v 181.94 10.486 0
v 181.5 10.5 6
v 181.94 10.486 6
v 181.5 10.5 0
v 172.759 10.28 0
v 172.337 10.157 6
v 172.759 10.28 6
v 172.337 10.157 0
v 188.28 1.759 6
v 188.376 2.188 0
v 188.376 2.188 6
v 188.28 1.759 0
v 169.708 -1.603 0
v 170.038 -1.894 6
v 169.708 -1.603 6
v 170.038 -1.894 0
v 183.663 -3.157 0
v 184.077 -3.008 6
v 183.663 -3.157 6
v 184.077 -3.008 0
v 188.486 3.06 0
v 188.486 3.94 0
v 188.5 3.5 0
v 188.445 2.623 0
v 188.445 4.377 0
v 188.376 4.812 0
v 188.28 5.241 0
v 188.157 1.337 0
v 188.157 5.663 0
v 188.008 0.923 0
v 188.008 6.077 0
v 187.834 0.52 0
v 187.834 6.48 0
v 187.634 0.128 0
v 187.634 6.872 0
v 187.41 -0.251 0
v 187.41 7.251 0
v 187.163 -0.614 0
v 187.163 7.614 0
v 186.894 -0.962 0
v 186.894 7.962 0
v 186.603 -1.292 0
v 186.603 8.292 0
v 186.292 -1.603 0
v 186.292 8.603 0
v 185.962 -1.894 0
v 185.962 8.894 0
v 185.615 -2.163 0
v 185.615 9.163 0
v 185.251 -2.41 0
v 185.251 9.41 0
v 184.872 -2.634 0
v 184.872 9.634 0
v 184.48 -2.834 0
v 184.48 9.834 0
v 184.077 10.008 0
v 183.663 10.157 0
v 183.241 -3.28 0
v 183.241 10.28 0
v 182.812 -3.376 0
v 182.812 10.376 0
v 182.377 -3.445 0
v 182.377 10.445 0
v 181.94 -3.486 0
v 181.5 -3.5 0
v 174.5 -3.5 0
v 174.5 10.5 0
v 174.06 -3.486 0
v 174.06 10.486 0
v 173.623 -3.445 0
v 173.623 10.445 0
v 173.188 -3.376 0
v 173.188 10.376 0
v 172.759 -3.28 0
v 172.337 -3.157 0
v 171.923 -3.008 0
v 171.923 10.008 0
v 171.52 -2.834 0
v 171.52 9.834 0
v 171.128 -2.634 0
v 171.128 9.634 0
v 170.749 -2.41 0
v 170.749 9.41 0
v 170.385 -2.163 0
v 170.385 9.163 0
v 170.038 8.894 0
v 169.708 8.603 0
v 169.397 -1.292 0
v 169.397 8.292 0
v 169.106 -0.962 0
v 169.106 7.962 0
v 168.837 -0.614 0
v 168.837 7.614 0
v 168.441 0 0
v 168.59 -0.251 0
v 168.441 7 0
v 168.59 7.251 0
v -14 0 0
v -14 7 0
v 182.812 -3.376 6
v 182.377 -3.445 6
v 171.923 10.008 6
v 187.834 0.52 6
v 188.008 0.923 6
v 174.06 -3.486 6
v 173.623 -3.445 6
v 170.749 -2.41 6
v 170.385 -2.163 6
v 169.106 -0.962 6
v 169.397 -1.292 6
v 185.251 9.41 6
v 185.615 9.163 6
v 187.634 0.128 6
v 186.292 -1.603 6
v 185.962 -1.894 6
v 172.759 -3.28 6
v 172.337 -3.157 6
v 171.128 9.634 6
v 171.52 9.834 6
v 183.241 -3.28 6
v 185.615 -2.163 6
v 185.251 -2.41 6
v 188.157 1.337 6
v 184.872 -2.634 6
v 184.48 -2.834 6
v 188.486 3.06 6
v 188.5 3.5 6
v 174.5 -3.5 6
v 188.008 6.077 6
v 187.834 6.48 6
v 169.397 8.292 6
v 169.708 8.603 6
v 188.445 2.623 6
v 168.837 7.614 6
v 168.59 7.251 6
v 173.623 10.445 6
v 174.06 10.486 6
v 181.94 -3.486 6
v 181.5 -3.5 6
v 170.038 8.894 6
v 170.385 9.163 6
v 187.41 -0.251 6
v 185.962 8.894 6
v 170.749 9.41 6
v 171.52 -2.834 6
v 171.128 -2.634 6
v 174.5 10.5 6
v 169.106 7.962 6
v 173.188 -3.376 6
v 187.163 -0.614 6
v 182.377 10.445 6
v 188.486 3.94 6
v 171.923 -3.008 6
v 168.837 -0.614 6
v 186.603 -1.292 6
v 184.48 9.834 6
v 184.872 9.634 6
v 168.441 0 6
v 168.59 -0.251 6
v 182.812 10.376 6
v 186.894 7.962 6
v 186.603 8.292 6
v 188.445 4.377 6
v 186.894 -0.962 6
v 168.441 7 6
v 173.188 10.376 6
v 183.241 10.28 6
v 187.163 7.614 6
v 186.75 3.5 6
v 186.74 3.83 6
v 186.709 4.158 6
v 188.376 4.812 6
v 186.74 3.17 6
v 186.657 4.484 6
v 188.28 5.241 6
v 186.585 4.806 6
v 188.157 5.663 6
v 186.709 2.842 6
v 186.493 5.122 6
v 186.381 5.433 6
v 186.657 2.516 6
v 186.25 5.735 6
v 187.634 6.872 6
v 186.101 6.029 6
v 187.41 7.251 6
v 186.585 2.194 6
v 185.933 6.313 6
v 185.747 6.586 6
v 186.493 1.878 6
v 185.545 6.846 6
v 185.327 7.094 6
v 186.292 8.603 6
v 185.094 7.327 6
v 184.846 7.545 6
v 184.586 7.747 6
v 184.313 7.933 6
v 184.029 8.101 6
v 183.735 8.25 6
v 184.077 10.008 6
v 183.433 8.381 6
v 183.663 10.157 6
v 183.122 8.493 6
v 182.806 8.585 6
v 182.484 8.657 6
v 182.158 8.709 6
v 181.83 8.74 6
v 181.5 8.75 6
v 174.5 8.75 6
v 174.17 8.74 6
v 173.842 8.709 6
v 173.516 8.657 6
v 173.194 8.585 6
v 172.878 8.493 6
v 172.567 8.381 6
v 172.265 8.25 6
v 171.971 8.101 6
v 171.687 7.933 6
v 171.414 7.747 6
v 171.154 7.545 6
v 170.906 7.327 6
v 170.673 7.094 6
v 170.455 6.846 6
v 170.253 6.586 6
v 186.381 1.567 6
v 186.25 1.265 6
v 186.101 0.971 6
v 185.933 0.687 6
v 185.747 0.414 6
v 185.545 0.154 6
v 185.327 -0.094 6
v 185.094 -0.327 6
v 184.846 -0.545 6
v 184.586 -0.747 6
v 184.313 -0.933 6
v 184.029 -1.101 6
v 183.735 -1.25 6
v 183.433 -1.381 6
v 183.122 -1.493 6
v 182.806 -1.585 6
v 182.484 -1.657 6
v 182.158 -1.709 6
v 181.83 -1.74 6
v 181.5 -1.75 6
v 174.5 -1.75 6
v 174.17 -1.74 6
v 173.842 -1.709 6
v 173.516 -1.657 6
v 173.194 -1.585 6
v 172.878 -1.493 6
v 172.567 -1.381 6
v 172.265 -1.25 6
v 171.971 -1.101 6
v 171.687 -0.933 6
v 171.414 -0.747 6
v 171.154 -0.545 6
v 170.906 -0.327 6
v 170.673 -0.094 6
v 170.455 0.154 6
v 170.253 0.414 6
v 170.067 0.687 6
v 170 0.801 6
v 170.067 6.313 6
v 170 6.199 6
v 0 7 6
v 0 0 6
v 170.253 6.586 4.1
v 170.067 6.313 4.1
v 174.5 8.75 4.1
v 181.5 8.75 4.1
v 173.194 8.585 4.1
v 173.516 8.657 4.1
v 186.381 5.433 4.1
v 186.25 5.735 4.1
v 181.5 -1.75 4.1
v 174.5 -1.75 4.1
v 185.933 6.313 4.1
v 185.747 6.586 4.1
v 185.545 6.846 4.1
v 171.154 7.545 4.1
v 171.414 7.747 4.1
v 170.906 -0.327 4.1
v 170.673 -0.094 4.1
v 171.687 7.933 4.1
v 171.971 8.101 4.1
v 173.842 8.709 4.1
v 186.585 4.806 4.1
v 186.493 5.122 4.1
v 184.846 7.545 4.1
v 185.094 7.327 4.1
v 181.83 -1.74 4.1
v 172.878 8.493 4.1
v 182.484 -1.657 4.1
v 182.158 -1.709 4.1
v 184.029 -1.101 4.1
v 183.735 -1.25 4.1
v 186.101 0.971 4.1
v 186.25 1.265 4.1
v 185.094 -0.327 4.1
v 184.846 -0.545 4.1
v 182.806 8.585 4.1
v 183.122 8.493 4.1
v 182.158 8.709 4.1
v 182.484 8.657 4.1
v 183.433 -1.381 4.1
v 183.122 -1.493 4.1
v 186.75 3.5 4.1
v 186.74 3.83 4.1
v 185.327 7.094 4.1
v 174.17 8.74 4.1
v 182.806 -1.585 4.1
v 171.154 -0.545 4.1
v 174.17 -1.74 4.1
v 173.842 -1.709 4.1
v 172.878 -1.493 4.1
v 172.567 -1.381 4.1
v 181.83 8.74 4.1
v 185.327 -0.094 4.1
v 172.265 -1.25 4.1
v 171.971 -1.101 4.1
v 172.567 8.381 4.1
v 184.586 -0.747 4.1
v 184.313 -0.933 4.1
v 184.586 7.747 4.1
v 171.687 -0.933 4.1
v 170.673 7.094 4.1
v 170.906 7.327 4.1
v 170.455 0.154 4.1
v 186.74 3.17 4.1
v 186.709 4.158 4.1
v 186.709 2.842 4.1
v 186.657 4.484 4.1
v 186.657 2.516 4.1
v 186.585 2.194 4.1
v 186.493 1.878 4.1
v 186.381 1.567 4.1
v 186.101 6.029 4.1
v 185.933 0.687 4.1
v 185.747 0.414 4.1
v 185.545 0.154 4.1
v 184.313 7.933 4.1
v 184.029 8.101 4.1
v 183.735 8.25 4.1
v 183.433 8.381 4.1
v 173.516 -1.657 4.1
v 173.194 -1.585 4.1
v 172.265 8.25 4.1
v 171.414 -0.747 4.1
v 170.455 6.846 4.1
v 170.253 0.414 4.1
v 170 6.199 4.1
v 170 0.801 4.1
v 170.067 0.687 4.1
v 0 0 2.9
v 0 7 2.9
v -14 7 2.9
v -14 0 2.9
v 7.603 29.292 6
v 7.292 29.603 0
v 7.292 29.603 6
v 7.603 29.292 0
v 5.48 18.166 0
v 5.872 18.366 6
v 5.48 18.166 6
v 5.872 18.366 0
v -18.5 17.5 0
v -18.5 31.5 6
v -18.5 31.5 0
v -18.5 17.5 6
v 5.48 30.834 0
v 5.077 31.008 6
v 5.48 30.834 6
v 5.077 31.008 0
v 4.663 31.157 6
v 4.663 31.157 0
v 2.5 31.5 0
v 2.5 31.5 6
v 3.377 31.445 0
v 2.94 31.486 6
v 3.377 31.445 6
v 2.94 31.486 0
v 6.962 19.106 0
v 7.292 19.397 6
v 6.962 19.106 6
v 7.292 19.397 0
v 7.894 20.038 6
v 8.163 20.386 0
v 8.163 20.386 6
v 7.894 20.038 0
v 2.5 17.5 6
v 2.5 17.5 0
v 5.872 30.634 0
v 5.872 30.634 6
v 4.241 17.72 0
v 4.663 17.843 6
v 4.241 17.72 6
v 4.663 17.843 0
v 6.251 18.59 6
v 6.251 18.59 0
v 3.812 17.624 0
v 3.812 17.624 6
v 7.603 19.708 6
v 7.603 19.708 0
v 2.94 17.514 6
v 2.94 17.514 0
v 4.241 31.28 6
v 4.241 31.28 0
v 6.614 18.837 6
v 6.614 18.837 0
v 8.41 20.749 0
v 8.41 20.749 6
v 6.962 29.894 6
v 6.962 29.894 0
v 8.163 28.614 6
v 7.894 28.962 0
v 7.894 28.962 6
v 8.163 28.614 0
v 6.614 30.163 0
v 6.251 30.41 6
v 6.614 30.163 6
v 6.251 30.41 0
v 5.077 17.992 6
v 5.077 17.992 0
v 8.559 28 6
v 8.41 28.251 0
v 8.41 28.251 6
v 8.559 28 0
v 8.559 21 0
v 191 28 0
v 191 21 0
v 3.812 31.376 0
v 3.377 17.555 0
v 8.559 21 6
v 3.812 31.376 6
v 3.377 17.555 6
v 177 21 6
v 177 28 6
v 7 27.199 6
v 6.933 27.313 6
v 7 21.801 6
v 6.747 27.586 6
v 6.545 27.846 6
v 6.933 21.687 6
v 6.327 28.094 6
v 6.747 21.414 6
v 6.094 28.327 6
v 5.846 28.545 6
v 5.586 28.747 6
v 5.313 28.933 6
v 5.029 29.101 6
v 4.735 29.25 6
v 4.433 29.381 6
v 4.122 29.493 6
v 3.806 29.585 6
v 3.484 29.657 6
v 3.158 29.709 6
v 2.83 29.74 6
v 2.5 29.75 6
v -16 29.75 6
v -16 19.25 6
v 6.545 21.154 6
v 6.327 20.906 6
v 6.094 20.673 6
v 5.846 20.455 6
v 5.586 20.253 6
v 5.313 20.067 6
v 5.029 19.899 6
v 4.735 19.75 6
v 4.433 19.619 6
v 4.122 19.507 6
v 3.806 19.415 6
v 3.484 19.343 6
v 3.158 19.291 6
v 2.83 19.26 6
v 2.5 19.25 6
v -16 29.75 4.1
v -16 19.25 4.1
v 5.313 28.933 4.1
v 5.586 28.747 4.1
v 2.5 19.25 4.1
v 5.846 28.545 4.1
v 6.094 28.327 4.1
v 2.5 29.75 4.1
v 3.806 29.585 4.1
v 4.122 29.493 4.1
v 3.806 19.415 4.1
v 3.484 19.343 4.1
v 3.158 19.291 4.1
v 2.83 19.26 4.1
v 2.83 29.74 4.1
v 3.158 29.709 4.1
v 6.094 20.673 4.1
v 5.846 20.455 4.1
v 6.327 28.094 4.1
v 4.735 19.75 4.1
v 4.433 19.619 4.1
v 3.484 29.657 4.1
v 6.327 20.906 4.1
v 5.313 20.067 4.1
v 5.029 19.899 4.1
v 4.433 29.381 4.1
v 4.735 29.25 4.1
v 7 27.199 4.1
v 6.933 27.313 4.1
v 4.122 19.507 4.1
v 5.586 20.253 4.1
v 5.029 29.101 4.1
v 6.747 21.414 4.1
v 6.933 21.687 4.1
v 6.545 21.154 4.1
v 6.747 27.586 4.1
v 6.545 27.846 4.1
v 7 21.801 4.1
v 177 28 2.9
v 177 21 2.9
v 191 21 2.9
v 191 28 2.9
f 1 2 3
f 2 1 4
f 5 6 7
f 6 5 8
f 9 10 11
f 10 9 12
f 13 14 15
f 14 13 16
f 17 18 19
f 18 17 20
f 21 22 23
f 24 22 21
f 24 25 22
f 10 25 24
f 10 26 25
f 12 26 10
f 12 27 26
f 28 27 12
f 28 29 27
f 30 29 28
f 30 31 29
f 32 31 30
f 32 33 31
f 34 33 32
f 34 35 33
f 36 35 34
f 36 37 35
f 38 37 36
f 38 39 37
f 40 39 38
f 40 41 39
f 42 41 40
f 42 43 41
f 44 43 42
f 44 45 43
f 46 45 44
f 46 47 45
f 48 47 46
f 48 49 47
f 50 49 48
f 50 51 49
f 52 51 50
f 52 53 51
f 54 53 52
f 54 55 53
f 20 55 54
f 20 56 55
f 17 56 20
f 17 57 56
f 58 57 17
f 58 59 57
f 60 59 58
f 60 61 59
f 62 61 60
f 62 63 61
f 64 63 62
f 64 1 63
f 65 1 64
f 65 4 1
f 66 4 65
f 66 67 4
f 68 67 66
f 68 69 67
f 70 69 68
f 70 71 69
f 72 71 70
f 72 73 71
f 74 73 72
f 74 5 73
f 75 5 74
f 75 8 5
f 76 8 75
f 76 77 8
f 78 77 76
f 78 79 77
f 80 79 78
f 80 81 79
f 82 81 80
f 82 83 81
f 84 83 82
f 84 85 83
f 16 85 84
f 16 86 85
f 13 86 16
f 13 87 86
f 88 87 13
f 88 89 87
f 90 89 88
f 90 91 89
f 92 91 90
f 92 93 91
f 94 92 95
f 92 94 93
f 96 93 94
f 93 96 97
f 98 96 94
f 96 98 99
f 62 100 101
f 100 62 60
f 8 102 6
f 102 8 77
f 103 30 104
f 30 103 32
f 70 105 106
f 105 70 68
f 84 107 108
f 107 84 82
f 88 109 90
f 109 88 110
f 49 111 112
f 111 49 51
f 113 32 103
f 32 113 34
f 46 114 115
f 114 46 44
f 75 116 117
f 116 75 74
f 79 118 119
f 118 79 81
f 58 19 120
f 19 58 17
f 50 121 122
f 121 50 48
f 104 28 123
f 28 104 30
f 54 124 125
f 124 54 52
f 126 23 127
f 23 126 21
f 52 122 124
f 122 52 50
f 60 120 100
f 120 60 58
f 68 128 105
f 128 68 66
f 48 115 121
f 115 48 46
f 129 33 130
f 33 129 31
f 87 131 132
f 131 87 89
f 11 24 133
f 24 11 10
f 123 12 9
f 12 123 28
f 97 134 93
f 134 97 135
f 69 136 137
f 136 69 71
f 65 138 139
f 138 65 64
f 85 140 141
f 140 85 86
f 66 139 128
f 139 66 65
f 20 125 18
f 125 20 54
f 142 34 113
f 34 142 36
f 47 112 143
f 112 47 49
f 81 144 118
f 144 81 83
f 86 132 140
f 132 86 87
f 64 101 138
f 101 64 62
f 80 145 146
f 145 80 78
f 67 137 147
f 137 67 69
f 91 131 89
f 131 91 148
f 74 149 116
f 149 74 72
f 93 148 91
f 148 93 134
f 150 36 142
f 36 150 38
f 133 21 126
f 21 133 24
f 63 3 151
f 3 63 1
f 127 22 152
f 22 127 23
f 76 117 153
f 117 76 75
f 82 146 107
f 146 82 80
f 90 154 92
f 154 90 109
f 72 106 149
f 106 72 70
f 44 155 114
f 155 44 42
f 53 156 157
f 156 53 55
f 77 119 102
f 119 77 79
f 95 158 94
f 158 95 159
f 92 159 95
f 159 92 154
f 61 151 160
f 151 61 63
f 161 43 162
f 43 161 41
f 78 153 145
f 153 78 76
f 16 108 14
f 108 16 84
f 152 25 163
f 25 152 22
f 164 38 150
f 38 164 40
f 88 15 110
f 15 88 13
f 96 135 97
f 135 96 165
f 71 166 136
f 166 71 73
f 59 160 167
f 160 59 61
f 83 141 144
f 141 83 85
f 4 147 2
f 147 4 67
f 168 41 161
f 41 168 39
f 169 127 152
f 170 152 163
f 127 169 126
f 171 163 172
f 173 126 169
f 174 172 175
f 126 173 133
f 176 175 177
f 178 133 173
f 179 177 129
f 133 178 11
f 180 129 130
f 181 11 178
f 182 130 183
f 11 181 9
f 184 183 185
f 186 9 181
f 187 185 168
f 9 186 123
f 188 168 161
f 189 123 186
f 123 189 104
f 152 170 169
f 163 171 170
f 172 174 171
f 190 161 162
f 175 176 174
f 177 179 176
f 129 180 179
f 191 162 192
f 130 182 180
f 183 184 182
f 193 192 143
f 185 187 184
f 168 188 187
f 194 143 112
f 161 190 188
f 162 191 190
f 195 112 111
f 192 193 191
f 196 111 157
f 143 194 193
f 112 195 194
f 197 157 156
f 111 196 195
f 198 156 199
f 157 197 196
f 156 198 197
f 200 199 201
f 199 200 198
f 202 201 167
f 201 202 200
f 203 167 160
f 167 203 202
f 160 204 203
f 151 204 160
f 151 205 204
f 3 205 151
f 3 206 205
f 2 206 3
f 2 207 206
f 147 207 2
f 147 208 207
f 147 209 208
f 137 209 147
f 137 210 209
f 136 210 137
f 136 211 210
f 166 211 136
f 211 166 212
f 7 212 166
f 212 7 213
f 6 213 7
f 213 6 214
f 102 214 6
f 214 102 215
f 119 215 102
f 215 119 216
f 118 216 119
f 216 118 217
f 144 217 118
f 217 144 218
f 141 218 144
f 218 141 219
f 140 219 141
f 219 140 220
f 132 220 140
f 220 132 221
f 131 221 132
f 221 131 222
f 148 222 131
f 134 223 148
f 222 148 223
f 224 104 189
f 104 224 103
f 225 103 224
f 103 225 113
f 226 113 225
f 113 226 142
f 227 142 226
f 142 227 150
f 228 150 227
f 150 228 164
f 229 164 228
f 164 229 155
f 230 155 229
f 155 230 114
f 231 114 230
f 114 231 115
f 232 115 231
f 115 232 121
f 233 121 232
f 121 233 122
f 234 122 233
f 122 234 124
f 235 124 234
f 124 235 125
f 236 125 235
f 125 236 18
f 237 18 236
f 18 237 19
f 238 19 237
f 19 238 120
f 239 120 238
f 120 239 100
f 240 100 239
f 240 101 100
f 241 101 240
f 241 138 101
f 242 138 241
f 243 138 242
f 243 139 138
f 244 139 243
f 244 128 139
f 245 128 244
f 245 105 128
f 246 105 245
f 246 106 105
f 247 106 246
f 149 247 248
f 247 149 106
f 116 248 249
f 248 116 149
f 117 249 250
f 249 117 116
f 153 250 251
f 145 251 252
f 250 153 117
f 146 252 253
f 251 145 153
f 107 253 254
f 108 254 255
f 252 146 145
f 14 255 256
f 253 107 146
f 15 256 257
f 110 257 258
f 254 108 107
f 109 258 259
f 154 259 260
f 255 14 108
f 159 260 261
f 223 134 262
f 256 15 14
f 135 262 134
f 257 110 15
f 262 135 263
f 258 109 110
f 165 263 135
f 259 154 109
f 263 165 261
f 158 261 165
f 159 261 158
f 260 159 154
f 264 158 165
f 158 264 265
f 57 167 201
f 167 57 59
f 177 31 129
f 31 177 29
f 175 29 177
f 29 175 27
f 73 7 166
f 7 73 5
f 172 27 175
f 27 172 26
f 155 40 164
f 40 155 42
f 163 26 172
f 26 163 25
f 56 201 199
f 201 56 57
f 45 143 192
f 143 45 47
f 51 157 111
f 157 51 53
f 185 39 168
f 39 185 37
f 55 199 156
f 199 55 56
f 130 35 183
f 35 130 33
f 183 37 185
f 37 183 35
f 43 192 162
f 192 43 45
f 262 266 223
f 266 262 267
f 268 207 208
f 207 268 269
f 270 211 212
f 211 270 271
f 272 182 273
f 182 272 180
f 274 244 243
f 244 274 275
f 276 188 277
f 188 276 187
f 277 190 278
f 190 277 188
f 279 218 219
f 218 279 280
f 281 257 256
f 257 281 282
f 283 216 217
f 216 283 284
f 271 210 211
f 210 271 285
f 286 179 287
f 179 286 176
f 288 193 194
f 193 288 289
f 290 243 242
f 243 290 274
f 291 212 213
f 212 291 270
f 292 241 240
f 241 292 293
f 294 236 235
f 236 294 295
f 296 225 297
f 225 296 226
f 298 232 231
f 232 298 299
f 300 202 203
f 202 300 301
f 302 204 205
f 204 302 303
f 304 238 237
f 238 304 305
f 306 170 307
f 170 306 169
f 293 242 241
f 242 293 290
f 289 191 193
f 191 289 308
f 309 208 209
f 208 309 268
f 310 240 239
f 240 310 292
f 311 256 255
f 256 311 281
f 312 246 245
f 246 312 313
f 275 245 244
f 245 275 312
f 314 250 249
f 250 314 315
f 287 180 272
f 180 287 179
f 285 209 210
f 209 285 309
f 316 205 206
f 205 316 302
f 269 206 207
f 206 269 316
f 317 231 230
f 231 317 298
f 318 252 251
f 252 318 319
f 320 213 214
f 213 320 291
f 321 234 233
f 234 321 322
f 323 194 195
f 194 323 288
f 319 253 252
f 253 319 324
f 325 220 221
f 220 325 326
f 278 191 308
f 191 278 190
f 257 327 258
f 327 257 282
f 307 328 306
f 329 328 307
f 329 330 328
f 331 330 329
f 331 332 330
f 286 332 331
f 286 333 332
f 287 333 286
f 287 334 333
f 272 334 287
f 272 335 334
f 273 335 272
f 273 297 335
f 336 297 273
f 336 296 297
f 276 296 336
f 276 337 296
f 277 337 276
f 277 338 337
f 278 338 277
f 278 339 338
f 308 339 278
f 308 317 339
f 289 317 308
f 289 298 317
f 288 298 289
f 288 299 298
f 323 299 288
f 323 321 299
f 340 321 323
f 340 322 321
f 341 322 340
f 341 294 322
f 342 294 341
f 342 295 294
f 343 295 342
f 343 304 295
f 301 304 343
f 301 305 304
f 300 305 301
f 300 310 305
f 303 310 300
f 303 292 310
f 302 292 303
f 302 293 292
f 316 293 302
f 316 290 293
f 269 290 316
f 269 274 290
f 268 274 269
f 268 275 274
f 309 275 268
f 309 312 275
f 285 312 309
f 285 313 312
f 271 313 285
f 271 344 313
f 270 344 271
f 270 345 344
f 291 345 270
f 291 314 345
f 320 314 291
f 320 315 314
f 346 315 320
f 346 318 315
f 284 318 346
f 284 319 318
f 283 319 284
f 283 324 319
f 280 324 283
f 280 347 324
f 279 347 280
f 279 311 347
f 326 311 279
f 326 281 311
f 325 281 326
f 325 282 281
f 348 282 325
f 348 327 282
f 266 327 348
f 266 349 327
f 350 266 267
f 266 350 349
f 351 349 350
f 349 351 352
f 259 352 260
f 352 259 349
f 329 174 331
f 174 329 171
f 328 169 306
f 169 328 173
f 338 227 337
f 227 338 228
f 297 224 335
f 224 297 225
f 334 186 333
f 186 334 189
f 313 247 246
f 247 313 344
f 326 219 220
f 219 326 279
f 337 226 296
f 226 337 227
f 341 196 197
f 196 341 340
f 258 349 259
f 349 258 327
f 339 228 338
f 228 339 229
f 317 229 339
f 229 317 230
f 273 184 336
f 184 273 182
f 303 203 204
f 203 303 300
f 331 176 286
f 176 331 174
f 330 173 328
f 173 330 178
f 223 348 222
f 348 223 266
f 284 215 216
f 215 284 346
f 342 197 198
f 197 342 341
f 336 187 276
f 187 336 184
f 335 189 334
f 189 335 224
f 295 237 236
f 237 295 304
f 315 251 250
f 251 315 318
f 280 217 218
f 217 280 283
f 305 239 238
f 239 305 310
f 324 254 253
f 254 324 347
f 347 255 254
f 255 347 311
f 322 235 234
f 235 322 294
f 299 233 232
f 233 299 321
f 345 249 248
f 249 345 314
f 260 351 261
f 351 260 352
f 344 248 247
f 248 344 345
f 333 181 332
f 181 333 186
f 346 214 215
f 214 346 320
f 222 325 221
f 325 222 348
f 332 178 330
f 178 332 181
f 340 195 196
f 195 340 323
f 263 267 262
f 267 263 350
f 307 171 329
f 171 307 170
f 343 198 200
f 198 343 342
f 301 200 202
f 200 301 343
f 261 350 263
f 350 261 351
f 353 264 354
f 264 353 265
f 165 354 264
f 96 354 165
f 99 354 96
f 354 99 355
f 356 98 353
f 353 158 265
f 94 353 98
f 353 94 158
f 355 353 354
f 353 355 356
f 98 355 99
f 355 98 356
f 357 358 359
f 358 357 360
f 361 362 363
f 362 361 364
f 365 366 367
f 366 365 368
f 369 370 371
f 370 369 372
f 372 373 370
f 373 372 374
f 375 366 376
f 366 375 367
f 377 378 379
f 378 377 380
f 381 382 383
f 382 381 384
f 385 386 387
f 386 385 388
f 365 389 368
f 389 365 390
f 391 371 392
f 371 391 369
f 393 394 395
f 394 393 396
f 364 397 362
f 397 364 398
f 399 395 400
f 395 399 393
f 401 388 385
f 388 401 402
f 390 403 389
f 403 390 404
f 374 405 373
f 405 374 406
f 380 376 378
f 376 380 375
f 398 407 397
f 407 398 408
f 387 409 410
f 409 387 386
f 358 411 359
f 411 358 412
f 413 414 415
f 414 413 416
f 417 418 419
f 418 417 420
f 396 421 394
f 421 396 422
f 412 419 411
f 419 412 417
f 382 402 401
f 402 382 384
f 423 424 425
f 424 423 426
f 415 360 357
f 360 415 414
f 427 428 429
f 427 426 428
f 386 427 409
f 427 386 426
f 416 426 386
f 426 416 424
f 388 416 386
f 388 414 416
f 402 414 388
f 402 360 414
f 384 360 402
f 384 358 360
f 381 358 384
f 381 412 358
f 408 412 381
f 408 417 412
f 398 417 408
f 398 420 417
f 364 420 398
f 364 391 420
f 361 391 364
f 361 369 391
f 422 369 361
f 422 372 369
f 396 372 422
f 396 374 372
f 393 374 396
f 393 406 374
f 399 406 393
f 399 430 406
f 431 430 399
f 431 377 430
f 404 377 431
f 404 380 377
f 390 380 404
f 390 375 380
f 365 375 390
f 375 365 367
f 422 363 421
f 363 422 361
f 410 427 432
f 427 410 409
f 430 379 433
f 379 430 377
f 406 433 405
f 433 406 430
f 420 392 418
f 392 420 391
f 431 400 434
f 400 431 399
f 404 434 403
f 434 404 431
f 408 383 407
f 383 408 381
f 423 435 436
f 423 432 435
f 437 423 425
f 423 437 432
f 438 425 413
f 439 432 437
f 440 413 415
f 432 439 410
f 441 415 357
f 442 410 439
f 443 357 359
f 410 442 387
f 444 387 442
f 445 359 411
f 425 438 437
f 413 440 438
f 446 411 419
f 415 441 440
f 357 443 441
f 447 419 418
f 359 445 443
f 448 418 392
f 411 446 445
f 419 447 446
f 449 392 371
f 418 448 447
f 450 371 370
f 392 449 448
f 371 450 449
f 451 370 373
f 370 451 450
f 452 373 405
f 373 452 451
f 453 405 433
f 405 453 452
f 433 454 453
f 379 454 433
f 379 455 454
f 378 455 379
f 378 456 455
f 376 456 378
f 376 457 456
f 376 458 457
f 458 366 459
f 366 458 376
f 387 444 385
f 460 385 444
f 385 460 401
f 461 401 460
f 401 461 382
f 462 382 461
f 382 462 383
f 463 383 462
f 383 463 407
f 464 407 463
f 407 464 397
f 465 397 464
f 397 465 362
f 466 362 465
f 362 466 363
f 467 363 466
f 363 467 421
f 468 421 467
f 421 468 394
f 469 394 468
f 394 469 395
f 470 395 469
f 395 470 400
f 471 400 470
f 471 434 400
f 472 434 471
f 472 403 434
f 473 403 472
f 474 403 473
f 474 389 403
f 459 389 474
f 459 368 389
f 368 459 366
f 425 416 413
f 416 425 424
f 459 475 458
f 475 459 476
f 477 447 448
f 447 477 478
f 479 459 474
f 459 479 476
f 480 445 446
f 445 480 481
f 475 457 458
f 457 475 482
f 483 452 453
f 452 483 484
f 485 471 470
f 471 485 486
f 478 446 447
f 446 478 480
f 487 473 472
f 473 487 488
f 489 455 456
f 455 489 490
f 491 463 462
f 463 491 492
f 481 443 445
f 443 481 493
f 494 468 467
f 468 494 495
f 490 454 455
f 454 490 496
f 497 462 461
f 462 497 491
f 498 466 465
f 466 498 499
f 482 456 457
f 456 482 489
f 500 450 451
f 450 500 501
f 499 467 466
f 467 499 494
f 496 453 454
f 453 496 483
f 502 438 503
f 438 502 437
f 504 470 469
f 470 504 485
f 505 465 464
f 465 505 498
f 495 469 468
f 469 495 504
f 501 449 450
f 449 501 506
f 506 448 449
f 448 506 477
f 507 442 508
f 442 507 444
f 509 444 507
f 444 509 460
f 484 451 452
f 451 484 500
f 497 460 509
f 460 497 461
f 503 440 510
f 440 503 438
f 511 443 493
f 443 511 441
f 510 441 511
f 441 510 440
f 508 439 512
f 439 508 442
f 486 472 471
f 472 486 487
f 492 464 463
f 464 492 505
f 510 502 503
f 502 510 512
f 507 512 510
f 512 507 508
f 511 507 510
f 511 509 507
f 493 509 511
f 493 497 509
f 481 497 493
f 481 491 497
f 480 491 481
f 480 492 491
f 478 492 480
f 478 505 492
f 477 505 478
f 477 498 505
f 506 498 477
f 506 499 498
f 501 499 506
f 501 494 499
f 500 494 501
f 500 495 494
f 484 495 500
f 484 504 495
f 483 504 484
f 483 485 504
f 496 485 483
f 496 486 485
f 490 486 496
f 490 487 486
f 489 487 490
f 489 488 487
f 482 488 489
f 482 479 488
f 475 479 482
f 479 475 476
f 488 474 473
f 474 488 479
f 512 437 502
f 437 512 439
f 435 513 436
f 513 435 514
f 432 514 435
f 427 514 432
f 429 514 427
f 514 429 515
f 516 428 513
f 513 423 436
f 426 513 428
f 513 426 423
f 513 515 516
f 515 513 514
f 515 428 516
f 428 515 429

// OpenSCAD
width = 170; // [50:300]
height = 6;  // [4:20]
depth = 7;   // [4:20]
UseCubicTip = "yes"; // [yes,no]
/* HIDDEN */
$fn=100;
CubicTip= (UseCubicTip=="yes");

P1(false);
translate([width+depth,depth*4])rotate(a=[0,0,180]) P1(CubicTip);

module P1(Cubic){    
    cS1 = depth*2;
    cS2 = depth*1.5;
    cube([width,depth,height]);
    translate([-depth*2,0])cube([depth*2,depth,height/2-0.1]);
    translate([width+depth-depth/2+1,depth/2]) difference(){
        hull(){
            cylinder(d=depth*2,h=height);
            if(Cubic) {translate([depth,-cS1/2]) cube([cS1,cS1,height]);}
            else {translate([depth,0]) cylinder(d=depth*2,h=height);}
        }
        translate([0,0,height*2/3+0.1]) hull(){
            cylinder(d=depth*1.5,h=height/3);
            if(Cubic) {translate([depth,-cS2/2]) cube([cS2+1,cS2,height/3]);}
            else {translate([depth,0]) cylinder(d=depth*1.5,h=height/3);}
        }
    }
}
